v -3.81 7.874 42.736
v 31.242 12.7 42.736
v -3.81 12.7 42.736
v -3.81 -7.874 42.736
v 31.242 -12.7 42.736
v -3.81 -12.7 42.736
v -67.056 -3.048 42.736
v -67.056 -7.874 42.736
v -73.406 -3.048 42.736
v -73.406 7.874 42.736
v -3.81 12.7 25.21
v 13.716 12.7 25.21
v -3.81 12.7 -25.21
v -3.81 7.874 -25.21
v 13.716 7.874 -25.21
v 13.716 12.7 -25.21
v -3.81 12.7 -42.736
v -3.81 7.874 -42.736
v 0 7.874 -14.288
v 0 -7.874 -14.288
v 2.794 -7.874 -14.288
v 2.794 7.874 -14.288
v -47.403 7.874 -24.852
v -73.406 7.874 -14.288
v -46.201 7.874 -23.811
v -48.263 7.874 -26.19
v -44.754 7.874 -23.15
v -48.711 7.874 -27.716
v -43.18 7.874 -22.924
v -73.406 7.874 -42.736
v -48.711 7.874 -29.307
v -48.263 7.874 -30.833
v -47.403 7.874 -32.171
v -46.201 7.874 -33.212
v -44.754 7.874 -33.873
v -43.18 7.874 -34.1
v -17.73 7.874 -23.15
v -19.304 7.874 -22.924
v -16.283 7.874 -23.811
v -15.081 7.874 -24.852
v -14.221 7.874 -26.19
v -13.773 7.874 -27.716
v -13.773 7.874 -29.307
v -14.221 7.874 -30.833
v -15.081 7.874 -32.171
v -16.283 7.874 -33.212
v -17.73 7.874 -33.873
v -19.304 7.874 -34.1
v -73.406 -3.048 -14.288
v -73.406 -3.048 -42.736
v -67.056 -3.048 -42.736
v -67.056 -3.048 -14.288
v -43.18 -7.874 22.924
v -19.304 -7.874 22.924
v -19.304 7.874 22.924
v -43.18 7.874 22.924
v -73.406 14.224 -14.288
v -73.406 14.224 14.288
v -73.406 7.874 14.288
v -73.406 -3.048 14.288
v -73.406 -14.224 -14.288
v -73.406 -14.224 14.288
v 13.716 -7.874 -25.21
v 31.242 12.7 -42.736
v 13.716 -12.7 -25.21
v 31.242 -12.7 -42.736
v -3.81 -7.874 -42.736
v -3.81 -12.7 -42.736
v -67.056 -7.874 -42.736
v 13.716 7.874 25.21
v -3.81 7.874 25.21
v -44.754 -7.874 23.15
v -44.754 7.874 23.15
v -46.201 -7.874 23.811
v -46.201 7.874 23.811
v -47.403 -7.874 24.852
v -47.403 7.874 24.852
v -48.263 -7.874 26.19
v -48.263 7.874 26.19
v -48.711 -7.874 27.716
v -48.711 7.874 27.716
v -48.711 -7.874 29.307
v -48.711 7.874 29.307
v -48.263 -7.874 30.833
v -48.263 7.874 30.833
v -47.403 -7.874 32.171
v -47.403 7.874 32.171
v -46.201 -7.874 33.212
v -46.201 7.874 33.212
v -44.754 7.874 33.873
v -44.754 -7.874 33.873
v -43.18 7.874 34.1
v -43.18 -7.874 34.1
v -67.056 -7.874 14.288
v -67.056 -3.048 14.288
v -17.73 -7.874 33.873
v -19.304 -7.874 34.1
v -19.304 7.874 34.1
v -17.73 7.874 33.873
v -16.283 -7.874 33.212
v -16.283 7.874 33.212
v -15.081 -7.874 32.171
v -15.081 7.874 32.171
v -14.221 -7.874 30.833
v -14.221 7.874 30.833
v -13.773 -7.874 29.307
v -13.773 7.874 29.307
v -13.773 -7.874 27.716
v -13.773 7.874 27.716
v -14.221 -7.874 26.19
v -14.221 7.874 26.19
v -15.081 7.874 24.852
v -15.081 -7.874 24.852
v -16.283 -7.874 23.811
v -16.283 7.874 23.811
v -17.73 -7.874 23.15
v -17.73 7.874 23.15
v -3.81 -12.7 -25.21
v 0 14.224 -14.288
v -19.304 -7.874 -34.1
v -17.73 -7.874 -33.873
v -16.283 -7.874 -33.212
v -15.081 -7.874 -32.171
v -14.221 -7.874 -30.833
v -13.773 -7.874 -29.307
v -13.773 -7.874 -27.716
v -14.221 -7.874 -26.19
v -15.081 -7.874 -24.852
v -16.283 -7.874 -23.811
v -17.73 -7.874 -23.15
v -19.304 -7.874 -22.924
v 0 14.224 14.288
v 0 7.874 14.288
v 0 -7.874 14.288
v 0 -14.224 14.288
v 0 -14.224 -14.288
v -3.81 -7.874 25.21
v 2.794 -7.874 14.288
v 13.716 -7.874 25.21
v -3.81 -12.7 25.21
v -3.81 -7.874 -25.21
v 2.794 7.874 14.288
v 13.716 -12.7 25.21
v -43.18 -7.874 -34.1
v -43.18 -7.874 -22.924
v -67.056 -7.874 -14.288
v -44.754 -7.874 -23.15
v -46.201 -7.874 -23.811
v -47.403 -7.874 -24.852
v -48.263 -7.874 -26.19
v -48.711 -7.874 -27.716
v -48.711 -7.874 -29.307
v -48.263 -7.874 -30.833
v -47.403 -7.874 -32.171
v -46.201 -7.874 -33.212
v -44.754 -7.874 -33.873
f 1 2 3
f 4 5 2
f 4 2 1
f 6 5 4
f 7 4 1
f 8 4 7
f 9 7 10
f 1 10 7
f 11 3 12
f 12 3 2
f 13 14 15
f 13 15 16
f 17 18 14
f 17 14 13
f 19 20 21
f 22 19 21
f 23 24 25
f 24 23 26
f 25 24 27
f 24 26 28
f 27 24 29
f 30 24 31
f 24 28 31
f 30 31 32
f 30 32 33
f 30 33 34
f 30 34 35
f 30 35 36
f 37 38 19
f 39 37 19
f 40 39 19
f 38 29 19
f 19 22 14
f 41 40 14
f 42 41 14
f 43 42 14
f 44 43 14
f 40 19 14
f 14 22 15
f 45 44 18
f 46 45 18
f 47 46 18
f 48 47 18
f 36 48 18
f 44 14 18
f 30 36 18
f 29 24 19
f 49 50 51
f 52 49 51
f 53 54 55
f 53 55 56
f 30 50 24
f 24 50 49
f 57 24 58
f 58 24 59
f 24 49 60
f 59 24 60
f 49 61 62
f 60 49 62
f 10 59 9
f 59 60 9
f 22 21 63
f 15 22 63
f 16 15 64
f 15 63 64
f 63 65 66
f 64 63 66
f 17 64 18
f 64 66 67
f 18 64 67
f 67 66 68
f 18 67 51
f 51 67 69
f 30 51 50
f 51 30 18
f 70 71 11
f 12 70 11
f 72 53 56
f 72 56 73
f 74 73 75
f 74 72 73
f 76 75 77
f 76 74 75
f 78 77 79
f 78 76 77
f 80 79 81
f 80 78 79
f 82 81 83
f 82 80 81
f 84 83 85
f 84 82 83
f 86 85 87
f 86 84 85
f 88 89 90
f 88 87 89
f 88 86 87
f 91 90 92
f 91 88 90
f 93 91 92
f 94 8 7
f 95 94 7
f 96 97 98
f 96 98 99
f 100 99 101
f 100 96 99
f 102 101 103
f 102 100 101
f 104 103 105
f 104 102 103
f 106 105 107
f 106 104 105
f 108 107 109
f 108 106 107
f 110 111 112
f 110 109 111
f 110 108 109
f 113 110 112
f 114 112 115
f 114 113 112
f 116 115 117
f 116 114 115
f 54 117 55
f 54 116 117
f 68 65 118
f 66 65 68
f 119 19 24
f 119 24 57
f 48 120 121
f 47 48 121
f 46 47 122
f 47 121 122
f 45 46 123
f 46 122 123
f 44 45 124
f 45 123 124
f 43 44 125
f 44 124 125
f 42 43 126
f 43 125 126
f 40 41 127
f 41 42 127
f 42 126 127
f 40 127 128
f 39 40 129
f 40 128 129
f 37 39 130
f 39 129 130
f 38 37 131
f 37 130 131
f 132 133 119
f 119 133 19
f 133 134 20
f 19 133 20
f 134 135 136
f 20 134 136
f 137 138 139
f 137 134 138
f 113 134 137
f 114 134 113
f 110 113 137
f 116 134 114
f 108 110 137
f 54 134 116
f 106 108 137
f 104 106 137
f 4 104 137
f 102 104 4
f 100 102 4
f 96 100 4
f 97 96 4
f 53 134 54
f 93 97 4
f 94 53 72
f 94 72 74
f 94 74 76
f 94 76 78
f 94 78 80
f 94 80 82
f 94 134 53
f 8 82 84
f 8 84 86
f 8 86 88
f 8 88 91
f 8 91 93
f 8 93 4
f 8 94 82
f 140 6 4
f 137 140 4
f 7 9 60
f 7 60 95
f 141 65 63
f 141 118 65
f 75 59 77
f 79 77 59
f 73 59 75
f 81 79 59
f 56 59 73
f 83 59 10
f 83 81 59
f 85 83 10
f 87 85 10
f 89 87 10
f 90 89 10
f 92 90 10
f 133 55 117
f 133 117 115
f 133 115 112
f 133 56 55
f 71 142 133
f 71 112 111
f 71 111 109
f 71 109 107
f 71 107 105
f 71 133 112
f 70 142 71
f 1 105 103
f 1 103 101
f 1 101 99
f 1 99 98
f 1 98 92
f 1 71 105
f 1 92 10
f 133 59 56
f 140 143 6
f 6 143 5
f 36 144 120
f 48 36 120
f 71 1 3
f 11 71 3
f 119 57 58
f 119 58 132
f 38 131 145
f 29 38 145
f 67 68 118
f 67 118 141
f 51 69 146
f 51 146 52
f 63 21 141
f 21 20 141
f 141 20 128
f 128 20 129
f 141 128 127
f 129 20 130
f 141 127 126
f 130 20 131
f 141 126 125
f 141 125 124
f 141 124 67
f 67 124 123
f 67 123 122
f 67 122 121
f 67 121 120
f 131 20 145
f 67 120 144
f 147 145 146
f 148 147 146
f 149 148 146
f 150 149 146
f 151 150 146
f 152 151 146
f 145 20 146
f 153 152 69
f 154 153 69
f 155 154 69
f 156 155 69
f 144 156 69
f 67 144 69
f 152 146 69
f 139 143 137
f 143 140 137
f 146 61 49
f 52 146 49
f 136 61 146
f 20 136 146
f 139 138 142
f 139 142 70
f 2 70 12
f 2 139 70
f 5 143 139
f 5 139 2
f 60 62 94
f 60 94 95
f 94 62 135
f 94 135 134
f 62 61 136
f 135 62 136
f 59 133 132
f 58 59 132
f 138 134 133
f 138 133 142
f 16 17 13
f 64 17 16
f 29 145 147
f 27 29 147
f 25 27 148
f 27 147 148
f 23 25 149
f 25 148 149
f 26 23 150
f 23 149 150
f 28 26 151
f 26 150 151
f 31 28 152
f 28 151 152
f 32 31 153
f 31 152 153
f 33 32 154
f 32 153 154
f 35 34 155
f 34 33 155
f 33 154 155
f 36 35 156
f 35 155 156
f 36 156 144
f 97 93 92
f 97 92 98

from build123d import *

# Parameters (mm, degrees)
F0_W          = 6.35
F0_H          = 28.448
F1_DEPTH      = 14.224
F3_W          = 4.826
F3_H          = 10.922
F4_DEPTH      = 73.407
F4_DEPTH_BACK = 31.243
F2_W          = 3.81
F2_H          = 1.524
F2_W_2        = 6.35
F2_H_2        = 4.826
F5_DEPTH      = 28.448


with BuildPart() as f1:
    # F0 (on Front) → F1 (new body, symmetric)
    with BuildSketch(Plane.XZ):
        Polygon((0, 0), (0, 14.2875), (-67.056, 14.2875), (-73.406, 14.2875), (-73.406, 0), align=None)
        Polygon((-67.056, 14.2875), (0, 14.2875), (2.794, 14.2875), (13.716, 25.2095), (-3.5814, 25.2095), (-3.5814, 42.7355), (-67.056, 42.7355), align=None)
        with BuildLine():
            Line((-19.304, 22.9235), (-43.18, 22.9235))
            ThreePointArc((-43.18, 22.9235), (-48.768, 28.5115), (-43.18, 34.0995))
            Line((-43.18, 34.0995), (-19.304, 34.0995))
            ThreePointArc((-19.304, 34.0995), (-13.716, 28.5115), (-19.304, 22.9235))
        make_face(mode=Mode.SUBTRACT)
        with Locations((-70.231, 28.5115)):
            Rectangle(F0_W, F0_H)
        Polygon((-3.5814, 25.2095), (13.716, 25.2095), (31.242, 42.7355), (-3.5814, 42.7355), align=None)
    extrude(amount=F1_DEPTH, both=True)

    # F3 (on face) → F4 (cut, two sides)
    with BuildSketch(Plane.YZ) as f4_sk:
        Polygon((-14.224, 42.7355), (-14.224, 14.2875), (-12.7, 14.2875), (-12.7, 25.2095), (-12.7, 42.7355), align=None)
        with Locations((-10.287, 19.7485)):
            Rectangle(F3_W, F3_H)
        Polygon((12.7, 14.2875), (14.224, 14.2875), (14.224, 42.7355), (12.7, 42.7355), (12.7, 25.2095), align=None)
        with Locations((10.287, 19.7485)):
            Rectangle(F3_W, F3_H)
    extrude(amount=-F4_DEPTH, mode=Mode.SUBTRACT)
    extrude(f4_sk.sketch, amount=F4_DEPTH_BACK, mode=Mode.SUBTRACT)

    # F2 (on face) → F5 (cut, through all)
    with BuildSketch(Plane.XY.offset(42.7355)):
        Polygon((-3.81, 14.224), (-73.406, 14.224), (-73.406, 7.874), (-3.81, 7.874), (-3.81, 12.7), align=None)
        with Locations((-1.905, 13.462)):
            Rectangle(F2_W, F2_H)
        with Locations((-1.905, -13.462)):
            Rectangle(F2_W, F2_H)
        Polygon((-73.406, -14.224), (-3.81, -14.224), (-3.81, -12.7), (-3.81, -7.874), (-67.056, -7.874), (-73.406, -7.874), align=None)
        with Locations((-70.231, -5.461)):
            Rectangle(F2_W_2, F2_H_2)
    extrude(amount=-F5_DEPTH, mode=Mode.SUBTRACT)

    # F6: F1 across plane


with BuildPart() as f1_1:
    add(f1.part)
    add(f1.part.mirror(Plane.XY))


solid = f1_1.part
